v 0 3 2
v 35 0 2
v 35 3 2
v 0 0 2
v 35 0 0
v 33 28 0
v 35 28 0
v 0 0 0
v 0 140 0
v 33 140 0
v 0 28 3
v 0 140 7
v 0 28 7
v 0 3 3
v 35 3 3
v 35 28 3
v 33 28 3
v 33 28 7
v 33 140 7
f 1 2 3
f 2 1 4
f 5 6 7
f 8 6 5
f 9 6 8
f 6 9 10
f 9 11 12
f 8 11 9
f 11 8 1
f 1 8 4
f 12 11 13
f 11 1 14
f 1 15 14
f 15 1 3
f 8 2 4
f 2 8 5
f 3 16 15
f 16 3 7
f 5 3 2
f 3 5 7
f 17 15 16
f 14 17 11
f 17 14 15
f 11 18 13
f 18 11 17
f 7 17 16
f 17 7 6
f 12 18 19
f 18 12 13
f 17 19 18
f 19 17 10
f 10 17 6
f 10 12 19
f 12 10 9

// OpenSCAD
translate([2.5, 1.5, 1.0]) color([0.0785385396518038, 0.07032946587635569, 0.3592533148212369]) cube([5, 3, 2], center=true);
translate([7.5, 1.5, 1.0]) color([0.029377507756986443, 0.3478777272843395, 0.009964241312966027]) cube([5, 3, 2], center=true);
translate([12.5, 1.5, 1.0]) color([0.9743235128409679, 0.8190066990688627, 0.07051761147818736]) cube([5, 3, 2], center=true);
translate([17.5, 1.5, 1.0]) color([0.8934350918478603, 0.20797804000401565, 0.20479079826934998]) cube([5, 3, 2], center=true);
translate([22.5, 1.5, 1.0]) color([0.6737591455288341, 0.9382622681625481, 0.12318812122923739]) cube([5, 3, 2], center=true);
translate([27.5, 1.5, 1.0]) color([0.007184567252270457, 0.3691301471700257, 0.024650014436155776]) cube([5, 3, 2], center=true);
translate([32.5, 1.5, 1.0]) color([0.6048482375805311, 0.8591756086192088, 0.1869917024228578]) cube([5, 3, 2], center=true);
translate([3.5, 5.5, 1.5]) color([0.11239103583018406, 0.34444960733861085, 0.9591715206073138]) cube([7, 5, 3], center=true);
translate([10.5, 5.5, 1.5]) color([0.13015769442868408, 0.9665192604669938, 0.36223986994484925]) cube([7, 5, 3], center=true);
translate([17.5, 5.5, 1.5]) color([0.47337040276011155, 0.29263198596497353, 0.9371268442154698]) cube([7, 5, 3], center=true);
translate([24.5, 5.5, 1.5]) color([0.9581478949874975, 0.6359157065077434, 0.18404555017515556]) cube([7, 5, 3], center=true);
translate([31.5, 5.5, 1.5]) color([0.9929517886102871, 0.10258043954691198, 0.5808493815940804]) cube([7, 5, 3], center=true);
translate([3.5, 10.5, 1.5]) color([0.15640306008300875, 0.8976753141502056, 0.9456783914956152]) cube([7, 5, 3], center=true);
translate([10.5, 10.5, 1.5]) color([0.8043902980001079, 0.3158914186681244, 0.2428386899579852]) cube([7, 5, 3], center=true);
translate([17.5, 10.5, 1.5]) color([0.7548584132190378, 0.291059519145354, 0.4197853778540753]) cube([7, 5, 3], center=true);
translate([24.5, 10.5, 1.5]) color([0.04625567690264132, 0.13223381043380655, 0.020549620641776678]) cube([7, 5, 3], center=true);
translate([31.5, 10.5, 1.5]) color([0.0779211200935358, 0.07321114936486084, 0.42023170217414685]) cube([7, 5, 3], center=true);
translate([3.5, 15.5, 1.5]) color([0.5507771776374378, 0.740878819870922, 0.14228347384241602]) cube([7, 5, 3], center=true);
translate([10.5, 15.5, 1.5]) color([0.4221887461694188, 0.6369660374117204, 0.08455569481893255]) cube([7, 5, 3], center=true);
translate([17.5, 15.5, 1.5]) color([0.44481115514620384, 0.3692560392397978, 0.9489319289416618]) cube([7, 5, 3], center=true);
translate([24.5, 15.5, 1.5]) color([0.05785711390101722, 0.40862622118314806, 0.41722547979620506]) cube([7, 5, 3], center=true);
translate([31.5, 15.5, 1.5]) color([0.728180504599678, 0.3206710028745039, 0.20399027594623398]) cube([7, 5, 3], center=true);
translate([3.5, 20.5, 1.5]) color([0.2933116551663051, 0.4708875424493587, 0.9502683295716211]) cube([7, 5, 3], center=true);
translate([10.5, 20.5, 1.5]) color([0.7965170227633064, 0.2769702457797433, 0.5581815883930463]) cube([7, 5, 3], center=true);
translate([17.5, 20.5, 1.5]) color([0.6882003035685332, 0.7956571556821322, 0.4461643839498476]) cube([7, 5, 3], center=true);
translate([24.5, 20.5, 1.5]) color([0.398776905129706, 0.7676407428212785, 0.43171649556411207]) cube([7, 5, 3], center=true);
translate([31.5, 20.5, 1.5]) color([0.2479576688970051, 0.4534470315306477, 0.9371046462904561]) cube([7, 5, 3], center=true);
translate([3.5, 25.5, 1.5]) color([0.14256748821860132, 0.4624353545272121, 0.6373035243637815]) cube([7, 5, 3], center=true);
translate([10.5, 25.5, 1.5]) color([0.48328798826810027, 0.20363990437036994, 0.0018431606156659175]) cube([7, 5, 3], center=true);
translate([17.5, 25.5, 1.5]) color([0.698991711803439, 0.6187355180234525, 0.007776649435864202]) cube([7, 5, 3], center=true);
translate([24.5, 25.5, 1.5]) color([0.2985601210181208, 0.7686342595428415, 0.6289203785446209]) cube([7, 5, 3], center=true);
translate([31.5, 25.5, 1.5]) color([0.5452081159439722, 0.1562211098090489, 0.7062940429996885]) cube([7, 5, 3], center=true);
translate([5.5, 31.5, 3.5]) color([0.4714349217158037, 0.6781787462359636, 0.7600898367234922]) cube([11, 7, 7], center=true);
translate([16.5, 31.5, 3.5]) color([0.23236272144124515, 0.7619950130977117, 0.28008838468838926]) cube([11, 7, 7], center=true);
translate([27.5, 31.5, 3.5]) color([0.9840151371182455, 0.12083161078451865, 0.8837180187440564]) cube([11, 7, 7], center=true);
translate([5.5, 38.5, 3.5]) color([0.040547125043371324, 0.256575818348144, 0.5261019087624684]) cube([11, 7, 7], center=true);
translate([16.5, 38.5, 3.5]) color([0.5816161834445946, 0.3962349850280922, 0.10203172822707107]) cube([11, 7, 7], center=true);
translate([27.5, 38.5, 3.5]) color([0.2526080858247133, 0.28339650386048865, 0.7552228545587315]) cube([11, 7, 7], center=true);
translate([5.5, 45.5, 3.5]) color([0.9087743252220071, 0.5954099154864194, 0.03545096569102746]) cube([11, 7, 7], center=true);
translate([16.5, 45.5, 3.5]) color([0.7922364716417103, 0.30560393283991993, 0.33989040641624346]) cube([11, 7, 7], center=true);
translate([27.5, 45.5, 3.5]) color([0.5301854376454147, 0.24904704757555507, 0.9199780878573697]) cube([11, 7, 7], center=true);
translate([5.5, 52.5, 3.5]) color([0.1635547583408129, 0.41483040050373277, 0.2896919495072058]) cube([11, 7, 7], center=true);
translate([16.5, 52.5, 3.5]) color([0.5198341022016146, 0.5739818030823766, 0.6271396891048426]) cube([11, 7, 7], center=true);
translate([27.5, 52.5, 3.5]) color([0.5313758038379728, 0.4108045023355995, 0.634594012376466]) cube([11, 7, 7], center=true);
translate([5.5, 59.5, 3.5]) color([0.40341287658681757, 0.7785502590540477, 0.7881774252549901]) cube([11, 7, 7], center=true);
translate([16.5, 59.5, 3.5]) color([0.29225416811082217, 0.37180432355577453, 0.6288109059468862]) cube([11, 7, 7], center=true);
translate([27.5, 59.5, 3.5]) color([0.15706996711565713, 0.6970319309869248, 0.3814277529807131]) cube([11, 7, 7], center=true);
translate([5.5, 66.5, 3.5]) color([0.591062474757007, 0.1395330992312218, 0.6682583860975598]) cube([11, 7, 7], center=true);
translate([16.5, 66.5, 3.5]) color([0.3540578606136997, 0.4726655762072315, 0.4151074008495357]) cube([11, 7, 7], center=true);
translate([27.5, 66.5, 3.5]) color([0.47671524799509457, 0.6946956329164442, 0.31824017683207795]) cube([11, 7, 7], center=true);
translate([5.5, 73.5, 3.5]) color([0.6520544808985483, 0.060222107499701916, 0.3001851524622099]) cube([11, 7, 7], center=true);
translate([16.5, 73.5, 3.5]) color([0.7452096901500458, 0.05240587806206365, 0.6211421952822352]) cube([11, 7, 7], center=true);
translate([27.5, 73.5, 3.5]) color([0.025546799267838538, 0.4715288683099005, 0.8885450437134765]) cube([11, 7, 7], center=true);
translate([5.5, 80.5, 3.5]) color([0.010110093997603875, 0.5268280206539229, 0.06645682965886301]) cube([11, 7, 7], center=true);
translate([16.5, 80.5, 3.5]) color([0.8671097761494883, 0.6862965222396646, 0.7419538566814291]) cube([11, 7, 7], center=true);
translate([27.5, 80.5, 3.5]) color([0.669007579945888, 0.006423453698145676, 0.041177862257898545]) cube([11, 7, 7], center=true);
translate([5.5, 87.5, 3.5]) color([0.6208768040220466, 0.9996851255769114, 0.8731472390917929]) cube([11, 7, 7], center=true);
translate([16.5, 87.5, 3.5]) color([0.699685806725371, 0.7270999543422898, 0.2266870226016624]) cube([11, 7, 7], center=true);
translate([27.5, 87.5, 3.5]) color([0.751613934135812, 0.28792410486343756, 0.10546026702239297]) cube([11, 7, 7], center=true);
translate([5.5, 94.5, 3.5]) color([0.4608948954667579, 0.33019577252961807, 0.168255398651179]) cube([11, 7, 7], center=true);
translate([16.5, 94.5, 3.5]) color([0.42170989251140467, 0.8972009769638755, 0.4352702732981688]) cube([11, 7, 7], center=true);
translate([27.5, 94.5, 3.5]) color([0.4472918952497248, 0.708827757444238, 0.5241618701522923]) cube([11, 7, 7], center=true);
translate([5.5, 101.5, 3.5]) color([0.12922303534199353, 0.91039239754397, 0.4441243361619651]) cube([11, 7, 7], center=true);
translate([16.5, 101.5, 3.5]) color([0.7893377392253591, 0.38887513002224416, 0.806846018820692]) cube([11, 7, 7], center=true);
translate([27.5, 101.5, 3.5]) color([0.3895364160074527, 0.2201595216660458, 0.19619466691666865]) cube([11, 7, 7], center=true);
translate([5.5, 108.5, 3.5]) color([0.9400346443375104, 0.58653025858102, 0.04979326505826487]) cube([11, 7, 7], center=true);
translate([16.5, 108.5, 3.5]) color([0.38834759617804915, 0.234029260524927, 0.08465706460929934]) cube([11, 7, 7], center=true);
translate([27.5, 108.5, 3.5]) color([0.18675586852140846, 0.05699047999950346, 0.6380736282281027]) cube([11, 7, 7], center=true);
translate([5.5, 115.5, 3.5]) color([0.17337386483746886, 0.6107798762435255, 0.6125067478912297]) cube([11, 7, 7], center=true);
translate([16.5, 115.5, 3.5]) color([0.7049237107399368, 0.5121186506114312, 0.28442399033479826]) cube([11, 7, 7], center=true);
translate([27.5, 115.5, 3.5]) color([0.8774574539285279, 0.35307108172351365, 0.4582943249787391]) cube([11, 7, 7], center=true);
translate([5.5, 122.5, 3.5]) color([0.6318794317305464, 0.5161242981674495, 0.9564683485665337]) cube([11, 7, 7], center=true);
translate([16.5, 122.5, 3.5]) color([0.9547176774381221, 0.9297598506094263, 0.9340763496652581]) cube([11, 7, 7], center=true);
translate([27.5, 122.5, 3.5]) color([0.580960135568696, 0.49020206373000297, 0.7041168173823689]) cube([11, 7, 7], center=true);
translate([5.5, 129.5, 3.5]) color([0.21541959298546798, 0.26587203921552827, 0.04380725363309168]) cube([11, 7, 7], center=true);
translate([16.5, 129.5, 3.5]) color([0.16285754255803098, 0.0038745499388105342, 0.6546275765234981]) cube([11, 7, 7], center=true);
translate([27.5, 129.5, 3.5]) color([0.14040698903568194, 0.7866793455760521, 0.680503995881725]) cube([11, 7, 7], center=true);
translate([5.5, 136.5, 3.5]) color([0.9706757933544957, 0.3965144869518913, 0.9213919134510528]) cube([11, 7, 7], center=true);
translate([16.5, 136.5, 3.5]) color([0.4537041723195332, 0.3395037398362071, 0.10233886991705377]) cube([11, 7, 7], center=true);
translate([27.5, 136.5, 3.5]) color([0.8828321850718597, 0.7947901585625868, 0.3229289765350606]) cube([11, 7, 7], center=true);
